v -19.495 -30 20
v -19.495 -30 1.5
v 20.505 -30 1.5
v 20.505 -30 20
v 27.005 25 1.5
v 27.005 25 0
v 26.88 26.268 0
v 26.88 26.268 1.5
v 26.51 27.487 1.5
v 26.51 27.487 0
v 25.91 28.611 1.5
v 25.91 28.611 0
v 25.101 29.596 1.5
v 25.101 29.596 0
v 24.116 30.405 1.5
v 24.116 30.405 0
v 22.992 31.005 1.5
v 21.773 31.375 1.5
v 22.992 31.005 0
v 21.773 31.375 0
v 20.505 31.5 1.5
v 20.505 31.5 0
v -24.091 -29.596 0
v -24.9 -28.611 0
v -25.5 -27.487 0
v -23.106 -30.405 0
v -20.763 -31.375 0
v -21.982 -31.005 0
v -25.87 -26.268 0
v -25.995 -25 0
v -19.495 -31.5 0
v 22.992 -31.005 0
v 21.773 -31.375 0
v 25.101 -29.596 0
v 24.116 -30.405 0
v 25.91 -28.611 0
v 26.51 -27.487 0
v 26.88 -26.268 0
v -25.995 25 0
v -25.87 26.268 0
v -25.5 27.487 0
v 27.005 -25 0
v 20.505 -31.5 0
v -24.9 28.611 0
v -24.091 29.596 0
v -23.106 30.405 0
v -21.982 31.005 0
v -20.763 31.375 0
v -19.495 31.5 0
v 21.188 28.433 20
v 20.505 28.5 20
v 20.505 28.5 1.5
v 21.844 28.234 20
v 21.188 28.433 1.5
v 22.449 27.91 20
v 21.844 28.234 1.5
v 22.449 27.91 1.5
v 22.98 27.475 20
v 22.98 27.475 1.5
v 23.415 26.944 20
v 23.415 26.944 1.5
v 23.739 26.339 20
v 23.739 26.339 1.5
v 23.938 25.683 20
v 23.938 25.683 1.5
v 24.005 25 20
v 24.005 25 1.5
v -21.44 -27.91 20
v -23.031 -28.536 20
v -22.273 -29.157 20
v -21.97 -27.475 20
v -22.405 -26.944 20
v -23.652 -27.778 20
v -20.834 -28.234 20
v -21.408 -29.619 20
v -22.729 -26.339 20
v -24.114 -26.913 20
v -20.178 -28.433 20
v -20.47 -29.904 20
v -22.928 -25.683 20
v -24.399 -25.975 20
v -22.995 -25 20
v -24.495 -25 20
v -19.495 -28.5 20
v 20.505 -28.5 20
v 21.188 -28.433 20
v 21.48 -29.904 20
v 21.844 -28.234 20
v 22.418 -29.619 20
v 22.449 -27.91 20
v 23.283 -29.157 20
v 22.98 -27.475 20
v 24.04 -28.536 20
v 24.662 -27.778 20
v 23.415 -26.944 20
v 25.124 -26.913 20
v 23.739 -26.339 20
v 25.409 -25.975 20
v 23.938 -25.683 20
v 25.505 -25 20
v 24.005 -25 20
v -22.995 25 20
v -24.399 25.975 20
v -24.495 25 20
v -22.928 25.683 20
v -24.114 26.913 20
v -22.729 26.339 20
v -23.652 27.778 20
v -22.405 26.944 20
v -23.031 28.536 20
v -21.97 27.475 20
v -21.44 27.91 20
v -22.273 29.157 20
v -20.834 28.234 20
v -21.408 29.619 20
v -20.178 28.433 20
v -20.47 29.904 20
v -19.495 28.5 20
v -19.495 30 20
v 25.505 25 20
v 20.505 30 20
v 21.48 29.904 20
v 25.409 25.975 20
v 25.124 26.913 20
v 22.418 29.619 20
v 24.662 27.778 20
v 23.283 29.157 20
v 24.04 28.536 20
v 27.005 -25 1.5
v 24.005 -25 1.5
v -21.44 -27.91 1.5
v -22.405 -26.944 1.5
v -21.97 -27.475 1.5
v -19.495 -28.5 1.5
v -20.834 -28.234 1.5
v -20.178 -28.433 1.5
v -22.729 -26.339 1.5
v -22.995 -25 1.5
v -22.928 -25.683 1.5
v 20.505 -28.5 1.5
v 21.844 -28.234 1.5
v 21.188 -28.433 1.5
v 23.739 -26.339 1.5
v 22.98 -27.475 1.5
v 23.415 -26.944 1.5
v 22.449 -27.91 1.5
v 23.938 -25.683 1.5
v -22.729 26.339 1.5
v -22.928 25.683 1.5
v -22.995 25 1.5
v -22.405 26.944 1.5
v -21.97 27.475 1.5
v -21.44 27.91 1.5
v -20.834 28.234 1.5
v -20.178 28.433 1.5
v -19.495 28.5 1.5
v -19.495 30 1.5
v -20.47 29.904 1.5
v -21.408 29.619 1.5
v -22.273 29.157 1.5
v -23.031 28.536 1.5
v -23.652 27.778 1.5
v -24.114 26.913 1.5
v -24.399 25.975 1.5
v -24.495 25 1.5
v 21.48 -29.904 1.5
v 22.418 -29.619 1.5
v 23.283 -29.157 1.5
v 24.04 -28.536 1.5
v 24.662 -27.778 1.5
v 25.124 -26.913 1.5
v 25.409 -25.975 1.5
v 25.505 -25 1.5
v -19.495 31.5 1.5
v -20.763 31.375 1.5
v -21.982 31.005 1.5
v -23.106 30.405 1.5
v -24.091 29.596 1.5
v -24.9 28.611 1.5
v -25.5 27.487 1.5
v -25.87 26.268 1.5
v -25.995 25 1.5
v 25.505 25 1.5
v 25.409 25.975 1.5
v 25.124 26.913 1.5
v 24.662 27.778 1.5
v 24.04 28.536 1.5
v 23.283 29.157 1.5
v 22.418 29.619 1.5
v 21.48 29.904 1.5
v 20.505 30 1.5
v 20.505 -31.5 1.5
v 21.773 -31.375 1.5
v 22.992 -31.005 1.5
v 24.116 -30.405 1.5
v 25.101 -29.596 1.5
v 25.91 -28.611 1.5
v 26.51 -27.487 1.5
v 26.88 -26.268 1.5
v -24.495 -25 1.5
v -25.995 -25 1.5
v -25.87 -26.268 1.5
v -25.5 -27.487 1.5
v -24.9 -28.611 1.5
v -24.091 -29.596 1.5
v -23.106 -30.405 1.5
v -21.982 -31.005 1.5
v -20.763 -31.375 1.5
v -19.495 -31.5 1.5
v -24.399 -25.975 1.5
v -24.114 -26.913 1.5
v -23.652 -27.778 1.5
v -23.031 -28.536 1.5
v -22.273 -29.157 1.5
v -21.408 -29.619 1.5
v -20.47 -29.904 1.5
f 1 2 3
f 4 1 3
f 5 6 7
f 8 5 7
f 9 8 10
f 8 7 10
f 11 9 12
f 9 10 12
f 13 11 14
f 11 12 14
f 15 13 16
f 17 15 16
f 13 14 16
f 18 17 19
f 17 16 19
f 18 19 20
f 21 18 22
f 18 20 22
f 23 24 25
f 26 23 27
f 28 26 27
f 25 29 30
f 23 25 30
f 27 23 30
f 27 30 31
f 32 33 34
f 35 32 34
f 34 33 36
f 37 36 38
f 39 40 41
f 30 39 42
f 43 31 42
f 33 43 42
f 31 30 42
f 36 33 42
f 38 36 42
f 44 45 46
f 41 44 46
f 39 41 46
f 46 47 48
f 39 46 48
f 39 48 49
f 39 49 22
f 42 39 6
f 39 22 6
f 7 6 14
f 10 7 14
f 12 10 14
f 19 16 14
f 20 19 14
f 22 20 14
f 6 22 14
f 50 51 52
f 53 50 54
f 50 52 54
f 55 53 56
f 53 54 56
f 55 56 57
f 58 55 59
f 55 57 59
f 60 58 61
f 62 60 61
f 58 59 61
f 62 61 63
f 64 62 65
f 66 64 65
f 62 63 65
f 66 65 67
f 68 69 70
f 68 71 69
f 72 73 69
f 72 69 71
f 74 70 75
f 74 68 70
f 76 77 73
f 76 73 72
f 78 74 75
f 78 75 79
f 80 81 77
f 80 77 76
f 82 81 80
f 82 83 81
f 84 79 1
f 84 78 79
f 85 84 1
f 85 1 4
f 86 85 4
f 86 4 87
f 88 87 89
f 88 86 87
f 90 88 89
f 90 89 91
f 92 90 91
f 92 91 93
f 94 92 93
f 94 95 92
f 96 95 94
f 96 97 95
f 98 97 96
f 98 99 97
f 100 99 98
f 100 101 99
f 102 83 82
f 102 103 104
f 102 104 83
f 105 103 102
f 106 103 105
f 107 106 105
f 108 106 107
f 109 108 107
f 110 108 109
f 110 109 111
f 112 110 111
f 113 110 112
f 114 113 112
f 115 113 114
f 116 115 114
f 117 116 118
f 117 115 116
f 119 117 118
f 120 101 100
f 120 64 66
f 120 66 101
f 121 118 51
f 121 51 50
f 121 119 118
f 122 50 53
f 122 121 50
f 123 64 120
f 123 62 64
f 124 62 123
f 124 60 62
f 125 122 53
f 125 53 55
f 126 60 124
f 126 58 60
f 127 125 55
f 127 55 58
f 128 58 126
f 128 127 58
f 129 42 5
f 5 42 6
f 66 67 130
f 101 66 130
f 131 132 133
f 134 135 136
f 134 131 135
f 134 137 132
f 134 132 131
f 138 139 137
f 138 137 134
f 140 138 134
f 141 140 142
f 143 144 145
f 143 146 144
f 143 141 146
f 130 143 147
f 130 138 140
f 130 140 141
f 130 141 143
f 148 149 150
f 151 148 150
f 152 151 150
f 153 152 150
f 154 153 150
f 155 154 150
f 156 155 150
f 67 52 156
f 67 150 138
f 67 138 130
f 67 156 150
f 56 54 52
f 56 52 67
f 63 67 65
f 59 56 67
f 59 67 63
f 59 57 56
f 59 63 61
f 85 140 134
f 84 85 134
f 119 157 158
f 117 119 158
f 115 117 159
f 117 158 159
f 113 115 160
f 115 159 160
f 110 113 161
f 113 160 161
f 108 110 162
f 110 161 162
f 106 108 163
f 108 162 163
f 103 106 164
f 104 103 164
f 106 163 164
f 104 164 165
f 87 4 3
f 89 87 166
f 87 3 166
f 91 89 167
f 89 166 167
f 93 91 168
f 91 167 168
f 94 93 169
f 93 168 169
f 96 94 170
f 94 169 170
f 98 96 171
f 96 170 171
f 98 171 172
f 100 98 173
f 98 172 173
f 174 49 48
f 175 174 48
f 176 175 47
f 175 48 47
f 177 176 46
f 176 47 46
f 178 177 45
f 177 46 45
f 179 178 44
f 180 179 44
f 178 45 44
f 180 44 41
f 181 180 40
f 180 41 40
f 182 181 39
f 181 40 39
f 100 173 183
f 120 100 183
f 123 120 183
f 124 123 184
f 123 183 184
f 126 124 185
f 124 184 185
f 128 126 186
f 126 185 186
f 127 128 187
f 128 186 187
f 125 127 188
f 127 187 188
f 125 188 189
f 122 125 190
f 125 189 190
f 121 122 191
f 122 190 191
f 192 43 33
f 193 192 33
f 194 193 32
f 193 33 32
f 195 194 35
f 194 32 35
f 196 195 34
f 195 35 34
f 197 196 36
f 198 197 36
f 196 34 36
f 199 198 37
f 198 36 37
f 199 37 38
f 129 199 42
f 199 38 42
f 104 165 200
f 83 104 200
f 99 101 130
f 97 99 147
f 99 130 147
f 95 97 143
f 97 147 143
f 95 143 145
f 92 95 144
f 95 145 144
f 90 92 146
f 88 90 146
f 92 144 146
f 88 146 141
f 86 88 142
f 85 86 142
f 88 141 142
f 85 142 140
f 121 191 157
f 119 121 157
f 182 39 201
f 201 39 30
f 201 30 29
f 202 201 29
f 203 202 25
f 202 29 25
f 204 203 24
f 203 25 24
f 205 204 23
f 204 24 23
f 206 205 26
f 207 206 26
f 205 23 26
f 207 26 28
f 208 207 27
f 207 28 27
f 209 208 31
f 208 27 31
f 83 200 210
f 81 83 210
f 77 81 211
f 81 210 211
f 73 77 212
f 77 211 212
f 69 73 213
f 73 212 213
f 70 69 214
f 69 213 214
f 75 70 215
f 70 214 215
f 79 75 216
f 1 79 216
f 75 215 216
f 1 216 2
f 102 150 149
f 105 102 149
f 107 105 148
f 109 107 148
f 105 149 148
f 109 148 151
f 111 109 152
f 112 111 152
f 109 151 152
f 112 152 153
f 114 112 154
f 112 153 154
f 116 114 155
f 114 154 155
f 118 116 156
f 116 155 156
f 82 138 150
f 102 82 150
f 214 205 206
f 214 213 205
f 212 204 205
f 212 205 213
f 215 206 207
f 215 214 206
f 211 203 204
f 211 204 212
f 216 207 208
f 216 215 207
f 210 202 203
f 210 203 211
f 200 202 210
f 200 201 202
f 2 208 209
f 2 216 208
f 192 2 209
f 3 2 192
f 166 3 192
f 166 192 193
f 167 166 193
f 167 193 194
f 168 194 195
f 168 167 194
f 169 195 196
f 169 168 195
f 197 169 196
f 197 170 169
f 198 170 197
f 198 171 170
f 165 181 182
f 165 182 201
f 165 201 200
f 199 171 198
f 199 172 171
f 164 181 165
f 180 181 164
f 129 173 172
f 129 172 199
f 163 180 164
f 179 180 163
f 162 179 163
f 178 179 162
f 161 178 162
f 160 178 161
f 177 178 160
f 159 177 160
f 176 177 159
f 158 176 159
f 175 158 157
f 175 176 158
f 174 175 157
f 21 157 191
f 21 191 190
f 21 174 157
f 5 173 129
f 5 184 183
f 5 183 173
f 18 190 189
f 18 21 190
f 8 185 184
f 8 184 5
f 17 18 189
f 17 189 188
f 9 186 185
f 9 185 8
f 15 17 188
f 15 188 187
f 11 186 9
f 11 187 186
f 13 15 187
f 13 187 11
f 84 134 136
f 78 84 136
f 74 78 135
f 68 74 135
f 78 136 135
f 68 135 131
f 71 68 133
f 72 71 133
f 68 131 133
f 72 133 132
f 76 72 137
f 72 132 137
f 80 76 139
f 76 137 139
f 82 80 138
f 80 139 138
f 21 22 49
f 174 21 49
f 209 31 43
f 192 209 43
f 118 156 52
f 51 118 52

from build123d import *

# Parameters (mm, degrees)
F1_DEPTH = 1.5
F2_DEPTH = 20


with BuildPart() as f1:
    # F0 (on Top) → F1 (new body)
    with BuildSketch(Plane.XY):
        with BuildLine():
            ThreePointArc((-19.49504, 31.5), (-24.091234, 29.596194), (-25.99504, 25))
            Line((-25.99504, 25), (-25.99504, -25))
            ThreePointArc((-25.99504, -25), (-24.091234, -29.596194), (-19.49504, -31.5))
            Line((-19.49504, -31.5), (20.50496, -31.5))
            ThreePointArc((20.50496, -31.5), (25.101155, -29.596194), (27.00496, -25))
            Line((27.00496, -25), (27.00496, 25))
            ThreePointArc((27.00496, 25), (25.101155, 29.596194), (20.50496, 31.5))
            Line((20.50496, 31.5), (-19.49504, 31.5))
        make_face()
        with BuildLine():
            Line((-19.49504, 30), (20.50496, 30))
            ThreePointArc((20.50496, 30), (24.040494, 28.535534), (25.50496, 25))
            Line((25.50496, 25), (25.50496, -25))
            ThreePointArc((25.50496, -25), (24.040494, -28.535534), (20.50496, -30))
            Line((20.50496, -30), (-19.49504, -30))
            ThreePointArc((-19.49504, -30), (-23.030573, -28.535534), (-24.49504, -25))
            Line((-24.49504, -25), (-24.49504, 25))
            ThreePointArc((-24.49504, 25), (-23.030573, 28.535534), (-19.49504, 30))
        make_face(mode=Mode.SUBTRACT)
        with BuildLine():
            ThreePointArc((25.50496, 25), (24.040494, 28.535534), (20.50496, 30))
            Line((20.50496, 30), (-19.49504, 30))
            ThreePointArc((-19.49504, 30), (-23.030573, 28.535534), (-24.49504, 25))
            Line((-24.49504, 25), (-24.49504, -25))
            ThreePointArc((-24.49504, -25), (-23.030573, -28.535534), (-19.49504, -30))
            Line((-19.49504, -30), (20.50496, -30))
            ThreePointArc((20.50496, -30), (24.040494, -28.535534), (25.50496, -25))
            Line((25.50496, -25), (25.50496, 25))
        make_face()
        with BuildLine():
            ThreePointArc((20.50496, 28.5), (22.979834, 27.474874), (24.00496, 25))
            Line((24.00496, 25), (24.00496, -25))
            ThreePointArc((24.00496, -25), (22.979834, -27.474874), (20.50496, -28.5))
            Line((20.50496, -28.5), (-19.49504, -28.5))
            ThreePointArc((-19.49504, -28.5), (-21.969913, -27.474874), (-22.99504, -25))
            Line((-22.99504, -25), (-22.99504, 25))
            ThreePointArc((-22.99504, 25), (-21.969913, 27.474874), (-19.49504, 28.5))
            Line((-19.49504, 28.5), (20.50496, 28.5))
        make_face(mode=Mode.SUBTRACT)
        with BuildLine():
            Line((24.00496, -25), (24.00496, 25))
            ThreePointArc((24.00496, 25), (22.979834, 27.474874), (20.50496, 28.5))
            Line((20.50496, 28.5), (-19.49504, 28.5))
            ThreePointArc((-19.49504, 28.5), (-21.969913, 27.474874), (-22.99504, 25))
            Line((-22.99504, 25), (-22.99504, -25))
            ThreePointArc((-22.99504, -25), (-21.969913, -27.474874), (-19.49504, -28.5))
            Line((-19.49504, -28.5), (20.50496, -28.5))
            ThreePointArc((20.50496, -28.5), (22.979834, -27.474874), (24.00496, -25))
        make_face()
    extrude(amount=F1_DEPTH)

    # F0 (on Top) → F2 (join)
    with BuildSketch(Plane.XY):
        with BuildLine():
            ThreePointArc((25.50496, 25), (24.040494, 28.535534), (20.50496, 30))
            Line((20.50496, 30), (-19.49504, 30))
            ThreePointArc((-19.49504, 30), (-23.030573, 28.535534), (-24.49504, 25))
            Line((-24.49504, 25), (-24.49504, -25))
            ThreePointArc((-24.49504, -25), (-23.030573, -28.535534), (-19.49504, -30))
            Line((-19.49504, -30), (20.50496, -30))
            ThreePointArc((20.50496, -30), (24.040494, -28.535534), (25.50496, -25))
            Line((25.50496, -25), (25.50496, 25))
        make_face()
        with BuildLine():
            ThreePointArc((20.50496, 28.5), (22.979834, 27.474874), (24.00496, 25))
            Line((24.00496, 25), (24.00496, -25))
            ThreePointArc((24.00496, -25), (22.979834, -27.474874), (20.50496, -28.5))
            Line((20.50496, -28.5), (-19.49504, -28.5))
            ThreePointArc((-19.49504, -28.5), (-21.969913, -27.474874), (-22.99504, -25))
            Line((-22.99504, -25), (-22.99504, 25))
            ThreePointArc((-22.99504, 25), (-21.969913, 27.474874), (-19.49504, 28.5))
            Line((-19.49504, 28.5), (20.50496, 28.5))
        make_face(mode=Mode.SUBTRACT)
    extrude(amount=F2_DEPTH)


solid = f1.part
